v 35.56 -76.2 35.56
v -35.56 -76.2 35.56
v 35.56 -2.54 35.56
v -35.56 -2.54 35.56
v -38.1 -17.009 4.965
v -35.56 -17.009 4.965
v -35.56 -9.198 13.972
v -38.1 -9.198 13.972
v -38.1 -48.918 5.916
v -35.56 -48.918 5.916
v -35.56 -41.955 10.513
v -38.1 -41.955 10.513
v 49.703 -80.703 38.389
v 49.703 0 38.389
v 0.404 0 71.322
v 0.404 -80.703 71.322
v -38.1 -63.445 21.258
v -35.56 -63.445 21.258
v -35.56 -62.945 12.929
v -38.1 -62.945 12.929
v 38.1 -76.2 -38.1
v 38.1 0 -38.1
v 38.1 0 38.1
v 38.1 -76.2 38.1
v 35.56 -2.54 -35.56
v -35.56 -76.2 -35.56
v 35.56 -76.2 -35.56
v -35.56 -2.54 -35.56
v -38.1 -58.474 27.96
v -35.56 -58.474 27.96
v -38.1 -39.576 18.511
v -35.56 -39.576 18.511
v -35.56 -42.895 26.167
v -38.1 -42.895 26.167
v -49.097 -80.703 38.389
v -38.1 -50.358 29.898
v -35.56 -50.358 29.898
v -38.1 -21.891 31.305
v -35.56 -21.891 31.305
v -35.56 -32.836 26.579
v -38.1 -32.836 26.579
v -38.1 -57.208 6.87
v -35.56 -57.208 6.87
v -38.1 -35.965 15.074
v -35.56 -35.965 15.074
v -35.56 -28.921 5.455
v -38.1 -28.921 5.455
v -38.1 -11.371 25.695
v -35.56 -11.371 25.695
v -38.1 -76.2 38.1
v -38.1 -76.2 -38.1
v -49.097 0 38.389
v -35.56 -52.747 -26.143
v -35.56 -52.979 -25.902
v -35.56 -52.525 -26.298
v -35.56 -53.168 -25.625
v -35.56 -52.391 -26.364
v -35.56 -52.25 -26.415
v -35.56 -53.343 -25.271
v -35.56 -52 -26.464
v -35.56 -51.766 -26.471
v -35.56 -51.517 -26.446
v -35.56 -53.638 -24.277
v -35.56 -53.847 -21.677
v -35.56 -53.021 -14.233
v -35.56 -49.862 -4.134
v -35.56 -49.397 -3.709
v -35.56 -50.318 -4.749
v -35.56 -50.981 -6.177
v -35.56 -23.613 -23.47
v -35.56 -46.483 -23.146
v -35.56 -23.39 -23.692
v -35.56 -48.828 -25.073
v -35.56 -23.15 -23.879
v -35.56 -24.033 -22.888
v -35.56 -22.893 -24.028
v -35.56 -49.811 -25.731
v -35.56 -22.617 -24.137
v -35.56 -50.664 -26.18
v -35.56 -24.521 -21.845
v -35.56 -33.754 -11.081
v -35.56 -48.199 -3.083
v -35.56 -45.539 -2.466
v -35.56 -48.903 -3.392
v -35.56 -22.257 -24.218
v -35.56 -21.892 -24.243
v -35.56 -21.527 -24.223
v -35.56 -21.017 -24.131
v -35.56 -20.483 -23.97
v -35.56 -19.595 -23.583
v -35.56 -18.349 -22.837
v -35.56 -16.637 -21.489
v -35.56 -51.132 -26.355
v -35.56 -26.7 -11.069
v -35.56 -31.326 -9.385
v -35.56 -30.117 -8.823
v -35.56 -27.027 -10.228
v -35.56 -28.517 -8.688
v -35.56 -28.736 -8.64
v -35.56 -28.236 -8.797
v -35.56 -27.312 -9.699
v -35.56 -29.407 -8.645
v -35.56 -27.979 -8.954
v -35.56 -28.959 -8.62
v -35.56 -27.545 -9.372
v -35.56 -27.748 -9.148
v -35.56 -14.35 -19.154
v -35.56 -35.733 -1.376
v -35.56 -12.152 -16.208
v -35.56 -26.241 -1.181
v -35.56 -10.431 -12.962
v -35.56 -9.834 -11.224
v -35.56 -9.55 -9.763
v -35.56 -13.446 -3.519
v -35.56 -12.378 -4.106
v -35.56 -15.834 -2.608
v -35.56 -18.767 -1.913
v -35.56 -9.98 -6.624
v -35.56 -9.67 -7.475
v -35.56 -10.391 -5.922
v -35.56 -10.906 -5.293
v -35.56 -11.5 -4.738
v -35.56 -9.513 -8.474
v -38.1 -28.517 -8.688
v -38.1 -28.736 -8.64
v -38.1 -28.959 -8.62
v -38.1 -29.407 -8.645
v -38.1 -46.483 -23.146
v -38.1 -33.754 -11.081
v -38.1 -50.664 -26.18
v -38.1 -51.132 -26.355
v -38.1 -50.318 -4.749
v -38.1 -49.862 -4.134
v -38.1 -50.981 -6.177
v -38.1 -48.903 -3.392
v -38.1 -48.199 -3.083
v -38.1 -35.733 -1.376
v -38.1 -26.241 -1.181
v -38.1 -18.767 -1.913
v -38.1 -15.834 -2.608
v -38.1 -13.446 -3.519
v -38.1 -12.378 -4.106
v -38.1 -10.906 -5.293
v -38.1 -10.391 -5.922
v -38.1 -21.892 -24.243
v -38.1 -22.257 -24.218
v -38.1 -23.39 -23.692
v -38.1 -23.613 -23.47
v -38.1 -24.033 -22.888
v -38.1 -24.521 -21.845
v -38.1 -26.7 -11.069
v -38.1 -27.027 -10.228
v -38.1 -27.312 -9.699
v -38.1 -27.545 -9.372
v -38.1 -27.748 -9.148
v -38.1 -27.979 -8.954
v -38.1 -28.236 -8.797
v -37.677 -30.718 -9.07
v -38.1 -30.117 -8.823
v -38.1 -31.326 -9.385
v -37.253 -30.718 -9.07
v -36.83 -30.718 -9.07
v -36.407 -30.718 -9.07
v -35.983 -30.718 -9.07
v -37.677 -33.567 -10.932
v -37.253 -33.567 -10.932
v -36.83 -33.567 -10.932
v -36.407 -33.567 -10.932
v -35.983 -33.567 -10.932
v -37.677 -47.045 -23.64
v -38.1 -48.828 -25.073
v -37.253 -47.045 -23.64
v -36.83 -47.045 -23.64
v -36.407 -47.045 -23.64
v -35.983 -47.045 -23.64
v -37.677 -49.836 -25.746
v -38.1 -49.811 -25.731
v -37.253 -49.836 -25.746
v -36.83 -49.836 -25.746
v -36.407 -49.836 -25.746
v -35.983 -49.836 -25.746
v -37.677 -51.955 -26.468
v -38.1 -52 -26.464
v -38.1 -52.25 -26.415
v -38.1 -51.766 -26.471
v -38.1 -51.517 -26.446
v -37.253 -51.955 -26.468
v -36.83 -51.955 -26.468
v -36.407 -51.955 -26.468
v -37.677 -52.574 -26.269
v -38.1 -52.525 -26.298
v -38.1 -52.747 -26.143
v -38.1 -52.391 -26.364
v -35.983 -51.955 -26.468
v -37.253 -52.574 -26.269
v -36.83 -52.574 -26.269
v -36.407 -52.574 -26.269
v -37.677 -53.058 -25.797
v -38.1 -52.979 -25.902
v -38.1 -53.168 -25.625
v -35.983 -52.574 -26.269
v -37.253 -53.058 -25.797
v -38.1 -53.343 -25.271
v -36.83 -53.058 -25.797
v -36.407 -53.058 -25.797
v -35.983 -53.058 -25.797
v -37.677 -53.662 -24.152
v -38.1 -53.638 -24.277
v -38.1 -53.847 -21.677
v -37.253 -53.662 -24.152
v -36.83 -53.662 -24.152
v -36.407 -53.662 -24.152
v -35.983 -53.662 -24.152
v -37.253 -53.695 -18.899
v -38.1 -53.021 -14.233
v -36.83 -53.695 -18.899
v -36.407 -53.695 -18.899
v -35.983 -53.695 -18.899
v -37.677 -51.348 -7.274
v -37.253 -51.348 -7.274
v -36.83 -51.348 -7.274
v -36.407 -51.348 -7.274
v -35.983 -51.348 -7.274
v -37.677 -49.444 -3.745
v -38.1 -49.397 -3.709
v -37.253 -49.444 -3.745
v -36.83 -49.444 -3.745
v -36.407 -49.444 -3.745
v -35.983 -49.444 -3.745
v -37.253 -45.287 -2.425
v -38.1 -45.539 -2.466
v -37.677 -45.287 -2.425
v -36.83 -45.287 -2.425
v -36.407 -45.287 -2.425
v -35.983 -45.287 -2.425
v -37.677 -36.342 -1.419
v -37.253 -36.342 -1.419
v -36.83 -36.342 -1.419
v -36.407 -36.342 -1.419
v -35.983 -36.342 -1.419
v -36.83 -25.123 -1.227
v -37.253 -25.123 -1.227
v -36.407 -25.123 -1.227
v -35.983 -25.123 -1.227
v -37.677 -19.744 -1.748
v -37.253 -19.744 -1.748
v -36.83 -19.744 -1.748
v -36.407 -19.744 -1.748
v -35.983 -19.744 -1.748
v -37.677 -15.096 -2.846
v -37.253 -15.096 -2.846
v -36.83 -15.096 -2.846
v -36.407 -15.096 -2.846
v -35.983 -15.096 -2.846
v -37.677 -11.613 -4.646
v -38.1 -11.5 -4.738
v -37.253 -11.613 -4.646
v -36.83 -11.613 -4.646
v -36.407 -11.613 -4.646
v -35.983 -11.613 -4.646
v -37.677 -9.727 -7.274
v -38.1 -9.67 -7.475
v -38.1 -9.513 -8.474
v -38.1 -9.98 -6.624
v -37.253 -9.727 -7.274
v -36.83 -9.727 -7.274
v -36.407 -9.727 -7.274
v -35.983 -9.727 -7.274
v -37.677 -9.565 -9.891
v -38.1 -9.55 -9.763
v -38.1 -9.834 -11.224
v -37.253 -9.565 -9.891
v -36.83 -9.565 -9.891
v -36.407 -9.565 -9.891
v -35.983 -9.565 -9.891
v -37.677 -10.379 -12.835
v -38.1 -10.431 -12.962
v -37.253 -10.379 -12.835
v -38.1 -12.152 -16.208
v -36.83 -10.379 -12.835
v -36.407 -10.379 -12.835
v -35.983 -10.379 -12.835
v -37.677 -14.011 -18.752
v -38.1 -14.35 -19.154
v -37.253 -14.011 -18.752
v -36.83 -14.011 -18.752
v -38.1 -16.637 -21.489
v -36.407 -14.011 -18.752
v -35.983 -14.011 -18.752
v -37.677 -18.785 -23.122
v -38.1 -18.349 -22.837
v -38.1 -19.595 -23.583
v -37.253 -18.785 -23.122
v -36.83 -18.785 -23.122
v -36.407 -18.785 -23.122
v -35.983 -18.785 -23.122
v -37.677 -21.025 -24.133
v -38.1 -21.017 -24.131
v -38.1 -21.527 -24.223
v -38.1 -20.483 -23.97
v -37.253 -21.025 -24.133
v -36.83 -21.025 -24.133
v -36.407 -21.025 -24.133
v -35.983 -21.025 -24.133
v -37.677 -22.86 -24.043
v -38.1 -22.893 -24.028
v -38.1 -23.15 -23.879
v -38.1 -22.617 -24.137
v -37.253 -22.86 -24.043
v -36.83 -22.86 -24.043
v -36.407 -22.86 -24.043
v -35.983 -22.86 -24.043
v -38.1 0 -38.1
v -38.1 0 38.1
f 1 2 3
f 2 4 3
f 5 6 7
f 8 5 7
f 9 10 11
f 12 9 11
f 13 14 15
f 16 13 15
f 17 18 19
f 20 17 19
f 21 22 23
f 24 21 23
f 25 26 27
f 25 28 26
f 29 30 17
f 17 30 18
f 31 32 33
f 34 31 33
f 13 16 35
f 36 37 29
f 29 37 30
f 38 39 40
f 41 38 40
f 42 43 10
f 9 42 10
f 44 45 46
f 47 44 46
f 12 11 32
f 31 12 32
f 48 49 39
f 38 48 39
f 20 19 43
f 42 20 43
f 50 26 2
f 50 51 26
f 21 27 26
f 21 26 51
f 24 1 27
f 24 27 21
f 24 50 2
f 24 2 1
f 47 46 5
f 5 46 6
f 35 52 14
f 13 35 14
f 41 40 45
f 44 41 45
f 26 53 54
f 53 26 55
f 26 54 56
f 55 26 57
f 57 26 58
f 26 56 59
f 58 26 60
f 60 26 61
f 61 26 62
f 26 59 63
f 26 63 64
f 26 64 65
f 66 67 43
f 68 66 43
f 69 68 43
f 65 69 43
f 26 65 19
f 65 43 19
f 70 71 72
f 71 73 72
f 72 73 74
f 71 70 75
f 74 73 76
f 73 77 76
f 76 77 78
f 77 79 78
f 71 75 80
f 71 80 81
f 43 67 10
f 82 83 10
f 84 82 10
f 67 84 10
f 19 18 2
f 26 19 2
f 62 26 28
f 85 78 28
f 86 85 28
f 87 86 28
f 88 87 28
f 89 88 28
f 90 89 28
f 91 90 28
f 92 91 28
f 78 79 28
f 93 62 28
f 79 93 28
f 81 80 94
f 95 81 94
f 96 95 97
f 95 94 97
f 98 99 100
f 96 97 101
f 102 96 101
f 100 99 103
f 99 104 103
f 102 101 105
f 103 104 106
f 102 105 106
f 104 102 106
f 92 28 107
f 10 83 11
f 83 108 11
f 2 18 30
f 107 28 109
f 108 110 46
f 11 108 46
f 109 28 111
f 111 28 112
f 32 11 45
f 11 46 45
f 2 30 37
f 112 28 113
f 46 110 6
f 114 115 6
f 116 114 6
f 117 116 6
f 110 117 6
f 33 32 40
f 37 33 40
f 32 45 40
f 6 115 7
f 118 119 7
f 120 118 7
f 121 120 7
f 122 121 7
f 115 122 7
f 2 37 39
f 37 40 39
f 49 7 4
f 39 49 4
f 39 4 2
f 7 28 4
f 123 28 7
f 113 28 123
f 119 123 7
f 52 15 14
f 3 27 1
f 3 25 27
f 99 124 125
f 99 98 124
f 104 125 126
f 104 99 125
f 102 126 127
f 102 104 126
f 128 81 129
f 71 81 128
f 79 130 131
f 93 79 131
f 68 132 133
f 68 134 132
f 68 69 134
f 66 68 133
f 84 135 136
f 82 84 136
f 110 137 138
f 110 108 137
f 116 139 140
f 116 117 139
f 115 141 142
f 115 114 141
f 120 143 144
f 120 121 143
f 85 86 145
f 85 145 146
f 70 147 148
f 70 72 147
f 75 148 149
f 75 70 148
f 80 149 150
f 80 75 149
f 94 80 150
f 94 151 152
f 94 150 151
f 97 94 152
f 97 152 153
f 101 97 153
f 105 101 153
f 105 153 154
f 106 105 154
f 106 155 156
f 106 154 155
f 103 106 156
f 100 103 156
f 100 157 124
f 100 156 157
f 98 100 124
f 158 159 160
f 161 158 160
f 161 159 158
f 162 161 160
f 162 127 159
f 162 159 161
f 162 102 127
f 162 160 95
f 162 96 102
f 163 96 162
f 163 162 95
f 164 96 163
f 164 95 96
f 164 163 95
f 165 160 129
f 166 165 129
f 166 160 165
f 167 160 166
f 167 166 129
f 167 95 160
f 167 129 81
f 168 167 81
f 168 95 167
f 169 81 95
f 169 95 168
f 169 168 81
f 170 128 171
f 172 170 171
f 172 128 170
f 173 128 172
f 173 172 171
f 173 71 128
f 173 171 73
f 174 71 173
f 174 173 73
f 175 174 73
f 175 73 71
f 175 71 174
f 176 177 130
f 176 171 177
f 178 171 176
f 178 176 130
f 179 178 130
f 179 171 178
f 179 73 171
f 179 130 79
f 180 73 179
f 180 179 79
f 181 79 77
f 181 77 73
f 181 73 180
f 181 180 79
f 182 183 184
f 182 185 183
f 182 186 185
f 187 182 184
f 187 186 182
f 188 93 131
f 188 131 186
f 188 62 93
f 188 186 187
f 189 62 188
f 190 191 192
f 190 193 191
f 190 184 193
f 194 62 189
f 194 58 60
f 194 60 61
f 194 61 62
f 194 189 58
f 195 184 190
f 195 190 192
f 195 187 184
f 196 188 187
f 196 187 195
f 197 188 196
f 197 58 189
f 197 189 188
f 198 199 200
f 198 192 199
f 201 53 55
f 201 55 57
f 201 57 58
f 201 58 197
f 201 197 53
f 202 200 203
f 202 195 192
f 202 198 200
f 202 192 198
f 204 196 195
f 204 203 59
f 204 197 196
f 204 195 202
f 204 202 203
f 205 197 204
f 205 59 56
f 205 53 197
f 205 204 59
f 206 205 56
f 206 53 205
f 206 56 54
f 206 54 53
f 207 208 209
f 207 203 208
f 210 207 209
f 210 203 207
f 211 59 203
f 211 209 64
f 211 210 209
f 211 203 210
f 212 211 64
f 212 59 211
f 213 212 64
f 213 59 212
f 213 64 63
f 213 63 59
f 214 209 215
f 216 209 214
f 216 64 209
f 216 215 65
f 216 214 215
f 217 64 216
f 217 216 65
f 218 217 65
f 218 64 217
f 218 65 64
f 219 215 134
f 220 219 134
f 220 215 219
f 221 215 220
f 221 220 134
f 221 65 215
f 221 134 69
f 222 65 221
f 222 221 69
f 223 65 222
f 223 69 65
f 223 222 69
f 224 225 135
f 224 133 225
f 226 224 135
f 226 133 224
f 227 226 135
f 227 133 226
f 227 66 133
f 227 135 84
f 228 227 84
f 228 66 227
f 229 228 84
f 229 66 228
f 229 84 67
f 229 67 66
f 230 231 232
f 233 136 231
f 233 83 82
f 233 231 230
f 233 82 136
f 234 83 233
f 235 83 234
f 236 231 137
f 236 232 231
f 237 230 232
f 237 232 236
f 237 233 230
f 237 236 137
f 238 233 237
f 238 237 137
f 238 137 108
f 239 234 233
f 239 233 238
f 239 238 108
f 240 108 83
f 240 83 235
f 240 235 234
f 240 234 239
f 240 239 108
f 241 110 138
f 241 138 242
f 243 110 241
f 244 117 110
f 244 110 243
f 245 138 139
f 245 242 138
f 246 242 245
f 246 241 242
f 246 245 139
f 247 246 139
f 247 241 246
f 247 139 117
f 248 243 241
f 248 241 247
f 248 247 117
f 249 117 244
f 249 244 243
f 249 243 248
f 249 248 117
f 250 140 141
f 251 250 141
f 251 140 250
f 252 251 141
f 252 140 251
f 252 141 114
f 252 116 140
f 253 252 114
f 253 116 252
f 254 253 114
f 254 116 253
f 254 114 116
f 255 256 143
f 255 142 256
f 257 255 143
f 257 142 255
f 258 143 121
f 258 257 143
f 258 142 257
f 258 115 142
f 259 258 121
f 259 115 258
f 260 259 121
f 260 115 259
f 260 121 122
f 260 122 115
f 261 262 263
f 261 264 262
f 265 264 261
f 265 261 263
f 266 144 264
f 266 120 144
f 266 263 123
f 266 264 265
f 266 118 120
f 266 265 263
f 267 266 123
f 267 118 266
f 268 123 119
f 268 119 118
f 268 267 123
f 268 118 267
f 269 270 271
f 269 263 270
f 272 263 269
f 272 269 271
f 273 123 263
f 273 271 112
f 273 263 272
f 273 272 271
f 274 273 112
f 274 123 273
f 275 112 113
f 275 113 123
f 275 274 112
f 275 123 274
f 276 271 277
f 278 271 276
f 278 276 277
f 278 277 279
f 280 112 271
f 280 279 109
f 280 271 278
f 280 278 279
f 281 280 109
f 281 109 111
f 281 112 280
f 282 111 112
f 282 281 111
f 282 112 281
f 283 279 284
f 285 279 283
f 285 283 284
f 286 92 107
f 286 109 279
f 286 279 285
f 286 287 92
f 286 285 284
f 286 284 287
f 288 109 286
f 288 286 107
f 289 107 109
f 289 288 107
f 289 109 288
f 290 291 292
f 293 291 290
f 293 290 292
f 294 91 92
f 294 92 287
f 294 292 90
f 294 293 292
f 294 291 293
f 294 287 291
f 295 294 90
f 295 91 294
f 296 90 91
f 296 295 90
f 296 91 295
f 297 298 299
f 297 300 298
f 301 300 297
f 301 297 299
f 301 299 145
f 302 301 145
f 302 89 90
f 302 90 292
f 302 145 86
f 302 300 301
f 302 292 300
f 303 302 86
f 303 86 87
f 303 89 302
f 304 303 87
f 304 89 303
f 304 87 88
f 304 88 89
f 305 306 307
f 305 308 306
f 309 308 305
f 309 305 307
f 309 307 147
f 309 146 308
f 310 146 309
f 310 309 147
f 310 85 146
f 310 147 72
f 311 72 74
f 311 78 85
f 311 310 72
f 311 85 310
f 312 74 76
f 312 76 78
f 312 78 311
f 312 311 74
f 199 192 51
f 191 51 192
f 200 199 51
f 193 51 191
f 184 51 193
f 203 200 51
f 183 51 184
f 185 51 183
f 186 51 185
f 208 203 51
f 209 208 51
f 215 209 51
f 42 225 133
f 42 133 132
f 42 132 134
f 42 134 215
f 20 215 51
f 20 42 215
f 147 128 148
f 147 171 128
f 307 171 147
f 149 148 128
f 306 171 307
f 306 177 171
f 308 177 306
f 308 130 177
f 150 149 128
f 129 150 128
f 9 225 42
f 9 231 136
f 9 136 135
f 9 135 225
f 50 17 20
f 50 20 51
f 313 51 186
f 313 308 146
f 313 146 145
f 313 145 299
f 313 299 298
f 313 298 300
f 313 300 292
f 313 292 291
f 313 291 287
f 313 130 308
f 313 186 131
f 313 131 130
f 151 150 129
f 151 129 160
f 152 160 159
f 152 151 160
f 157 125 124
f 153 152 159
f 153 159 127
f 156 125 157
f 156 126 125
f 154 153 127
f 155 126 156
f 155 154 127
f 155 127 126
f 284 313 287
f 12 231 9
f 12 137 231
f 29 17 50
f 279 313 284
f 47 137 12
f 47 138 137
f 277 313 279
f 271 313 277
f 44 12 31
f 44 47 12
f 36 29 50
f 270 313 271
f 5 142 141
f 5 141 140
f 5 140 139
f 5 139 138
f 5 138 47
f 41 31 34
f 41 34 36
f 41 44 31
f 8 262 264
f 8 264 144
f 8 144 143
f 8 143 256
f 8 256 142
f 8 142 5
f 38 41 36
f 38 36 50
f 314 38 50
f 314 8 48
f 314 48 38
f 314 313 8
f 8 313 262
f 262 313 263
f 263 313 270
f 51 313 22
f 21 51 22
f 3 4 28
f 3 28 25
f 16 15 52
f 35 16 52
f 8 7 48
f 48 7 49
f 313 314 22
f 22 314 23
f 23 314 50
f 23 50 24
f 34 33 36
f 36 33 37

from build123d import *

# Parameters (mm, degrees)
F0_W     = 76.2
F0_H     = 76.2
F1_DEPTH = 76.2
F2_T     = -2.54
F4_DEPTH = 80.70275
F6_DEPTH = 72.34948
F7_DEPTH = 45.27984


with BuildPart() as f1:
    # F0 (on Front) → F1 (new body)
    with BuildSketch(Plane.XZ):
        Rectangle(F0_W, F0_H)
    extrude(amount=F1_DEPTH)

    # F2
    f2_openings = [f1.faces().sort_by_distance(p)[0] for p in [
        (0, -76.2, 0),
    ]]
    offset(amount=F2_T, openings=f2_openings)

    # F5 (on Right) → F6 (cut)
    with BuildSketch(Plane.YZ):
        Polygon((-62.9445649822, 12.9286607004), (-57.2077408433, 6.8695452064), (-48.9183542253, 5.9155529274), (-41.9551012531, 10.5130674533), (-39.5761653803, 18.5108606416), (-42.8946771407, 26.166676174), (-50.3578680004, 29.898272878), (-58.4736280121, 27.9595951837), (-63.4445028697, 21.2577719303), align=None)
    extrude(amount=-F6_DEPTH, mode=Mode.SUBTRACT)

    # F5 (on Right) → F7 (cut)
    with BuildSketch(Plane.YZ):
        Polygon((-35.9649943015, 15.0744534794), (-28.9213731885, 5.4552275687), (-17.0091336025, 4.9646630483), (-9.198434917, 13.9721650078), (-11.3708925516, 25.694900752), (-21.8906015972, 31.3054111655), (-32.8360065796, 26.5788674732), align=None)
        with BuildLine():
            add(Edge.make_bspline(
                [(-28.5172834992, -8.687954396), (-33.3256495404, -7.3079547514), (-58.7633130578, -42.5680563185), (-51.5076013001, -4.5466579825), (-47.6608822964, -1.8810588006), (6.3846242278, 2.4318586114), (-28.2828882588, -36.7901174711), (-24.9310420648, -9.7172046367), (-28.5172834992, -8.687954396)],
                knots=[0, 0, 0, 0, 0.199088632, 0.3599428724, 0.4622095381, 0.6821064913, 0.851512989, 1, 1, 1, 1], degree=3))
        make_face()
        Polygon((-62.9445649822, 12.9286607004), (-57.2077408433, 6.8695452064), (-48.9183542253, 5.9155529274), (-41.9551012531, 10.5130674533), (-39.5761653803, 18.5108606416), (-42.8946771407, 26.166676174), (-50.3578680004, 29.898272878), (-58.4736280121, 27.9595951837), (-63.4445028697, 21.2577719303), align=None)
    extrude(amount=-F7_DEPTH, mode=Mode.SUBTRACT)


with BuildPart() as f4:
    # F3 (on Front) → F4 (new body)
    with BuildSketch(Plane.XZ):
        Polygon((-49.0970462561, 38.3886359632), (49.7031807899, 38.3886359632), (0.4040895437, 71.3220462203), align=None)
    extrude(amount=F4_DEPTH)


solid = Compound([f1.part, f4.part])
